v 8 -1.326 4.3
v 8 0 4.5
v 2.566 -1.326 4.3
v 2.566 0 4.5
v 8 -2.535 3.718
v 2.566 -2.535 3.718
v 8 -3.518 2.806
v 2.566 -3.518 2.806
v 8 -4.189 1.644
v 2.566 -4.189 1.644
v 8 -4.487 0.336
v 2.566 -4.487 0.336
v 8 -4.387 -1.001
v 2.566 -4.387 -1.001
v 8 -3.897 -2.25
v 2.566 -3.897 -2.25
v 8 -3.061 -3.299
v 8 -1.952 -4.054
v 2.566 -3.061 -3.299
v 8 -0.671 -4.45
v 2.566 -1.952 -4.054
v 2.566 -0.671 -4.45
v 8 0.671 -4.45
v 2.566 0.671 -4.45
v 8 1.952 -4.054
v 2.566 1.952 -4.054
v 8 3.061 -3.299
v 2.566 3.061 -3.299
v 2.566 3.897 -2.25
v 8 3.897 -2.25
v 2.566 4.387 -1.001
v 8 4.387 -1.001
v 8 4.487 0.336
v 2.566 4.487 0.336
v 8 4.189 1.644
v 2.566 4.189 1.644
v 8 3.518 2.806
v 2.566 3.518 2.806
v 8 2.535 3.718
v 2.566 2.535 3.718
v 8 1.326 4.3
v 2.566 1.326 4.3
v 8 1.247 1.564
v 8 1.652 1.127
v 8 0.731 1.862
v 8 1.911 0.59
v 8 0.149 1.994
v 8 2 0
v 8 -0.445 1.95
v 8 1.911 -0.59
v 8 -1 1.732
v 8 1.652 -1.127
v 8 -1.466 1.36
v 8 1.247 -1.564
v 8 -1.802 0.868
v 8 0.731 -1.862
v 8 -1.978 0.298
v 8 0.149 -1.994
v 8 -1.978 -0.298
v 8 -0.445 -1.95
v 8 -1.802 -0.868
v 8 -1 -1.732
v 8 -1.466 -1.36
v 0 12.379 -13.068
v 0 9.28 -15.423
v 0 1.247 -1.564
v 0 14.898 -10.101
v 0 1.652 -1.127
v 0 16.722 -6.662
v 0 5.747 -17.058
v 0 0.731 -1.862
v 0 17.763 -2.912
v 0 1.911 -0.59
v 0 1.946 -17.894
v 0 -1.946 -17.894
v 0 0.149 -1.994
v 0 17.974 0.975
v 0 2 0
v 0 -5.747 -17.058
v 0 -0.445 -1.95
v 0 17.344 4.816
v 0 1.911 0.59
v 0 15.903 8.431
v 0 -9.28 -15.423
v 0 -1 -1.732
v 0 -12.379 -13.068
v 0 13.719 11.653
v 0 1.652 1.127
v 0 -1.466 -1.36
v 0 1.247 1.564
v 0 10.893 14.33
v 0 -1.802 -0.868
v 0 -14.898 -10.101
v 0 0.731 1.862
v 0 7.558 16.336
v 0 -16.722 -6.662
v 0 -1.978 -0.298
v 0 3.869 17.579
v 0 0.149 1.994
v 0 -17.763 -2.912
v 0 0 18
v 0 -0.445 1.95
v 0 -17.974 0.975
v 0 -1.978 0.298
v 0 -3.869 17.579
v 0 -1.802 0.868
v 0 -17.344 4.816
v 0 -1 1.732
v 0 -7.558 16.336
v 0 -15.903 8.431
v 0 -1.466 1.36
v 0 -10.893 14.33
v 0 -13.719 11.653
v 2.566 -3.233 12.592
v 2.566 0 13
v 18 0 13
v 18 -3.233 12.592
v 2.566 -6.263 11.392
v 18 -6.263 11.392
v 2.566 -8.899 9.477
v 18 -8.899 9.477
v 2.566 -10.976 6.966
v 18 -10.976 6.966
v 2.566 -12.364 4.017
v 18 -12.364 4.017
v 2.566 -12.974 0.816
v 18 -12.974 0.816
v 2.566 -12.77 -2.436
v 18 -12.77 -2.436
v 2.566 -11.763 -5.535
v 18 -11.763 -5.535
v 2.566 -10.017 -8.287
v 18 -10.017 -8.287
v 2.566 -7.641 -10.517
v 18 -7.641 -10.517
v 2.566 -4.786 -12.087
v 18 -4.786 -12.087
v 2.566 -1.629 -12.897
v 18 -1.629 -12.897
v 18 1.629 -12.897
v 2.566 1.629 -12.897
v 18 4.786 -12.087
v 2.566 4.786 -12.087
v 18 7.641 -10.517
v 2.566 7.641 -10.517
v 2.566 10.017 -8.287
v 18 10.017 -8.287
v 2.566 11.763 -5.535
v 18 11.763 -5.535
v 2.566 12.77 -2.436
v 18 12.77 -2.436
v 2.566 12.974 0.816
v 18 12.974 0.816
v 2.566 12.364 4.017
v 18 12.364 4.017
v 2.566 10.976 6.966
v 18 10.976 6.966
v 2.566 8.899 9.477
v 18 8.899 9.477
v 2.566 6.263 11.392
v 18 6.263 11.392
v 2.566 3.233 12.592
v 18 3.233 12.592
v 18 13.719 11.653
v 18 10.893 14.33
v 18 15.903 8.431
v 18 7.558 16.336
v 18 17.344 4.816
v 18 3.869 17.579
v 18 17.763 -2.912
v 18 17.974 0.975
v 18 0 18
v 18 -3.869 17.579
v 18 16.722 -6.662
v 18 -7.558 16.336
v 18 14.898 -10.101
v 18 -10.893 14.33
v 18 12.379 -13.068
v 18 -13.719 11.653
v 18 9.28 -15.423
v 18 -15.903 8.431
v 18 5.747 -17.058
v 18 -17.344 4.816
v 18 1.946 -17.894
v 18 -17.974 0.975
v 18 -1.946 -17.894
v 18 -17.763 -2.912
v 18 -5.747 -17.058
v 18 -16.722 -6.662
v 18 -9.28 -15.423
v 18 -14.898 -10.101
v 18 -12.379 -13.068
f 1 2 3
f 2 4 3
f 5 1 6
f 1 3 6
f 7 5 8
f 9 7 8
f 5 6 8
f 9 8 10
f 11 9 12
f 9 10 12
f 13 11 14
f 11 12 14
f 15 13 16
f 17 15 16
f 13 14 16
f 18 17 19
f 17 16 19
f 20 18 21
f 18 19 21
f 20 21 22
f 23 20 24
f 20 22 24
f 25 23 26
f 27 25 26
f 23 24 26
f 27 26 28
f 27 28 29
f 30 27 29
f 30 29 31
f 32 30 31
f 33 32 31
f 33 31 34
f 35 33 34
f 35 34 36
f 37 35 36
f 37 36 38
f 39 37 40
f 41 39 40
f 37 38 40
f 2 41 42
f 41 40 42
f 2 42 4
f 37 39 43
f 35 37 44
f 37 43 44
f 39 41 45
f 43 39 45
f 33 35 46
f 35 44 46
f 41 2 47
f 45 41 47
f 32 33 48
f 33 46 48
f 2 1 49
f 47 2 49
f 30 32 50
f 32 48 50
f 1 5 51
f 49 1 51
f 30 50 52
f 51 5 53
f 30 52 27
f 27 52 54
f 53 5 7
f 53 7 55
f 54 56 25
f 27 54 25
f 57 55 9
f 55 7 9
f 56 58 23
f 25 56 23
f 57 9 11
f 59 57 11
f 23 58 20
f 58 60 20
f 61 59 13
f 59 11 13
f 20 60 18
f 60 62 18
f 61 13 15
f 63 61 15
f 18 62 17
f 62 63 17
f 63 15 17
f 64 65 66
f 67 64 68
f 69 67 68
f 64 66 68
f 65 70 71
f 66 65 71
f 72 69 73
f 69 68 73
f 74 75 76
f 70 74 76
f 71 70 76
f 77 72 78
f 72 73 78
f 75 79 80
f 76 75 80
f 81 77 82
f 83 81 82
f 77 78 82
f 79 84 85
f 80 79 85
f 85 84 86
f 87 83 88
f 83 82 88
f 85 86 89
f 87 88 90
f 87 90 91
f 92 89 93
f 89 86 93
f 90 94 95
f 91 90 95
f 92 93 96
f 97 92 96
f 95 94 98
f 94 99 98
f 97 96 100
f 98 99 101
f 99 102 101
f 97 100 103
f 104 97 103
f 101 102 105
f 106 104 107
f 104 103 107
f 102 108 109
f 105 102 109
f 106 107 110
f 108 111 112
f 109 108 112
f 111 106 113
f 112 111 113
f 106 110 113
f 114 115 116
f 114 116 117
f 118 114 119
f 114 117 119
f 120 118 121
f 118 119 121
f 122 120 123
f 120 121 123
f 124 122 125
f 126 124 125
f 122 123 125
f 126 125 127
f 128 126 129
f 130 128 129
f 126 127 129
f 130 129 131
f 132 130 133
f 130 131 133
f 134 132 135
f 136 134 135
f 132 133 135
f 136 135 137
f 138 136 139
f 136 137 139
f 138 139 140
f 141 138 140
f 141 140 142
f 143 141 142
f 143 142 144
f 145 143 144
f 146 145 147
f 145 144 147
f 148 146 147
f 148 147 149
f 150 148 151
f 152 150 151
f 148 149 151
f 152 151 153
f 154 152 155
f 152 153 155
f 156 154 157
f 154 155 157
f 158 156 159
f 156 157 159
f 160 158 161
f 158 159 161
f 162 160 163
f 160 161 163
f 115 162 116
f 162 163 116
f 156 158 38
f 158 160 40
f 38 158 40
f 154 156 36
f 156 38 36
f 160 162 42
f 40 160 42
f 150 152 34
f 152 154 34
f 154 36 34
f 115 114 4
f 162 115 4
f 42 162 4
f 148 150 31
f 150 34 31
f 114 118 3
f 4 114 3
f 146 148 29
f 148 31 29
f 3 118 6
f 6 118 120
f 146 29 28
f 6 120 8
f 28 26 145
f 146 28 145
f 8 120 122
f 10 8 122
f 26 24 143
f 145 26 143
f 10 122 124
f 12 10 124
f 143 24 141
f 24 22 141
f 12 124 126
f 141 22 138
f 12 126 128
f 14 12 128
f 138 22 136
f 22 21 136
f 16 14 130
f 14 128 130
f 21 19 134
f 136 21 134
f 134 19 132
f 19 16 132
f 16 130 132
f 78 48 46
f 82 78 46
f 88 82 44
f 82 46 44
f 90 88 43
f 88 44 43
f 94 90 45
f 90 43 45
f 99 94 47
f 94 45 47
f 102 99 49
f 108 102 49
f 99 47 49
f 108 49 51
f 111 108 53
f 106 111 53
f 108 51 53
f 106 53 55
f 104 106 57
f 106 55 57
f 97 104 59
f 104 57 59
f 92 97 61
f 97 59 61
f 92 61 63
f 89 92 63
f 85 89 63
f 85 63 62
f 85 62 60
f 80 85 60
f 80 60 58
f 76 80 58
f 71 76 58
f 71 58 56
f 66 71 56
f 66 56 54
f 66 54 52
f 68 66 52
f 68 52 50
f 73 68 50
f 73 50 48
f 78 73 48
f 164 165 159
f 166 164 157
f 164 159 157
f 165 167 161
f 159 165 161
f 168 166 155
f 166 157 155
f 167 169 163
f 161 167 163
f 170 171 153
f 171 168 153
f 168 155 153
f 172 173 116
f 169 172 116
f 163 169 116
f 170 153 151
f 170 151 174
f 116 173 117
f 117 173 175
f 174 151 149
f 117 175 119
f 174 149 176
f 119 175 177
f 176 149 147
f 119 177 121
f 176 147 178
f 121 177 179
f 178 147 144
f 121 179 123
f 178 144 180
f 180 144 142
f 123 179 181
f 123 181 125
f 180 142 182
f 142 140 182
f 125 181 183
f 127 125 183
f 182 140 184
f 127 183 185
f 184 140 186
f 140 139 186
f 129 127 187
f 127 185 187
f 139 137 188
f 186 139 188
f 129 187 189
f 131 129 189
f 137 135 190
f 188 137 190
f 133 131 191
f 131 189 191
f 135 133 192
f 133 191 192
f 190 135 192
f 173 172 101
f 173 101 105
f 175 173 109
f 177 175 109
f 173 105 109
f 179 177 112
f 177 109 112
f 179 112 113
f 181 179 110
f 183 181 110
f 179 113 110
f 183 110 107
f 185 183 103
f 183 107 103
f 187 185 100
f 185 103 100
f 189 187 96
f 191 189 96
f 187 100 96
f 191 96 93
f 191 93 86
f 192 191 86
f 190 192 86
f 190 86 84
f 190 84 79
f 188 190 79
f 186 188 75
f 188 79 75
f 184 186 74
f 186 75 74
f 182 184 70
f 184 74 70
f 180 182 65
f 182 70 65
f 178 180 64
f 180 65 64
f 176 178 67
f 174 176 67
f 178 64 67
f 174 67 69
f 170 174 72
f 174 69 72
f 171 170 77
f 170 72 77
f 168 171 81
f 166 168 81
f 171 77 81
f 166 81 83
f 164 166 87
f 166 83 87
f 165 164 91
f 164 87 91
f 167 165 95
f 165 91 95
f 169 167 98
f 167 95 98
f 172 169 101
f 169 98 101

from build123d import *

# Parameters (mm, degrees)
F2_R     = 2
F3_DEPTH = 25


with BuildPart() as f1:
    # F0 (on Front) → F1 (revolve)
    with BuildSketch(Plane.XZ):
        Polygon((0, 18), (0, 0), (8, 0), (8, 4.5), (2.56604, 4.5), (2.56604, 13), (18, 13), (18, 18), align=None)
    revolve(axis=Axis((1.852863, 0, 0), (1, 0, 0)))

    # F2 (on face) → F3 (cut)
    with BuildSketch(Plane.YZ.offset(8)):
        Circle(F2_R)
    extrude(amount=-F3_DEPTH, mode=Mode.SUBTRACT)


solid = f1.part
